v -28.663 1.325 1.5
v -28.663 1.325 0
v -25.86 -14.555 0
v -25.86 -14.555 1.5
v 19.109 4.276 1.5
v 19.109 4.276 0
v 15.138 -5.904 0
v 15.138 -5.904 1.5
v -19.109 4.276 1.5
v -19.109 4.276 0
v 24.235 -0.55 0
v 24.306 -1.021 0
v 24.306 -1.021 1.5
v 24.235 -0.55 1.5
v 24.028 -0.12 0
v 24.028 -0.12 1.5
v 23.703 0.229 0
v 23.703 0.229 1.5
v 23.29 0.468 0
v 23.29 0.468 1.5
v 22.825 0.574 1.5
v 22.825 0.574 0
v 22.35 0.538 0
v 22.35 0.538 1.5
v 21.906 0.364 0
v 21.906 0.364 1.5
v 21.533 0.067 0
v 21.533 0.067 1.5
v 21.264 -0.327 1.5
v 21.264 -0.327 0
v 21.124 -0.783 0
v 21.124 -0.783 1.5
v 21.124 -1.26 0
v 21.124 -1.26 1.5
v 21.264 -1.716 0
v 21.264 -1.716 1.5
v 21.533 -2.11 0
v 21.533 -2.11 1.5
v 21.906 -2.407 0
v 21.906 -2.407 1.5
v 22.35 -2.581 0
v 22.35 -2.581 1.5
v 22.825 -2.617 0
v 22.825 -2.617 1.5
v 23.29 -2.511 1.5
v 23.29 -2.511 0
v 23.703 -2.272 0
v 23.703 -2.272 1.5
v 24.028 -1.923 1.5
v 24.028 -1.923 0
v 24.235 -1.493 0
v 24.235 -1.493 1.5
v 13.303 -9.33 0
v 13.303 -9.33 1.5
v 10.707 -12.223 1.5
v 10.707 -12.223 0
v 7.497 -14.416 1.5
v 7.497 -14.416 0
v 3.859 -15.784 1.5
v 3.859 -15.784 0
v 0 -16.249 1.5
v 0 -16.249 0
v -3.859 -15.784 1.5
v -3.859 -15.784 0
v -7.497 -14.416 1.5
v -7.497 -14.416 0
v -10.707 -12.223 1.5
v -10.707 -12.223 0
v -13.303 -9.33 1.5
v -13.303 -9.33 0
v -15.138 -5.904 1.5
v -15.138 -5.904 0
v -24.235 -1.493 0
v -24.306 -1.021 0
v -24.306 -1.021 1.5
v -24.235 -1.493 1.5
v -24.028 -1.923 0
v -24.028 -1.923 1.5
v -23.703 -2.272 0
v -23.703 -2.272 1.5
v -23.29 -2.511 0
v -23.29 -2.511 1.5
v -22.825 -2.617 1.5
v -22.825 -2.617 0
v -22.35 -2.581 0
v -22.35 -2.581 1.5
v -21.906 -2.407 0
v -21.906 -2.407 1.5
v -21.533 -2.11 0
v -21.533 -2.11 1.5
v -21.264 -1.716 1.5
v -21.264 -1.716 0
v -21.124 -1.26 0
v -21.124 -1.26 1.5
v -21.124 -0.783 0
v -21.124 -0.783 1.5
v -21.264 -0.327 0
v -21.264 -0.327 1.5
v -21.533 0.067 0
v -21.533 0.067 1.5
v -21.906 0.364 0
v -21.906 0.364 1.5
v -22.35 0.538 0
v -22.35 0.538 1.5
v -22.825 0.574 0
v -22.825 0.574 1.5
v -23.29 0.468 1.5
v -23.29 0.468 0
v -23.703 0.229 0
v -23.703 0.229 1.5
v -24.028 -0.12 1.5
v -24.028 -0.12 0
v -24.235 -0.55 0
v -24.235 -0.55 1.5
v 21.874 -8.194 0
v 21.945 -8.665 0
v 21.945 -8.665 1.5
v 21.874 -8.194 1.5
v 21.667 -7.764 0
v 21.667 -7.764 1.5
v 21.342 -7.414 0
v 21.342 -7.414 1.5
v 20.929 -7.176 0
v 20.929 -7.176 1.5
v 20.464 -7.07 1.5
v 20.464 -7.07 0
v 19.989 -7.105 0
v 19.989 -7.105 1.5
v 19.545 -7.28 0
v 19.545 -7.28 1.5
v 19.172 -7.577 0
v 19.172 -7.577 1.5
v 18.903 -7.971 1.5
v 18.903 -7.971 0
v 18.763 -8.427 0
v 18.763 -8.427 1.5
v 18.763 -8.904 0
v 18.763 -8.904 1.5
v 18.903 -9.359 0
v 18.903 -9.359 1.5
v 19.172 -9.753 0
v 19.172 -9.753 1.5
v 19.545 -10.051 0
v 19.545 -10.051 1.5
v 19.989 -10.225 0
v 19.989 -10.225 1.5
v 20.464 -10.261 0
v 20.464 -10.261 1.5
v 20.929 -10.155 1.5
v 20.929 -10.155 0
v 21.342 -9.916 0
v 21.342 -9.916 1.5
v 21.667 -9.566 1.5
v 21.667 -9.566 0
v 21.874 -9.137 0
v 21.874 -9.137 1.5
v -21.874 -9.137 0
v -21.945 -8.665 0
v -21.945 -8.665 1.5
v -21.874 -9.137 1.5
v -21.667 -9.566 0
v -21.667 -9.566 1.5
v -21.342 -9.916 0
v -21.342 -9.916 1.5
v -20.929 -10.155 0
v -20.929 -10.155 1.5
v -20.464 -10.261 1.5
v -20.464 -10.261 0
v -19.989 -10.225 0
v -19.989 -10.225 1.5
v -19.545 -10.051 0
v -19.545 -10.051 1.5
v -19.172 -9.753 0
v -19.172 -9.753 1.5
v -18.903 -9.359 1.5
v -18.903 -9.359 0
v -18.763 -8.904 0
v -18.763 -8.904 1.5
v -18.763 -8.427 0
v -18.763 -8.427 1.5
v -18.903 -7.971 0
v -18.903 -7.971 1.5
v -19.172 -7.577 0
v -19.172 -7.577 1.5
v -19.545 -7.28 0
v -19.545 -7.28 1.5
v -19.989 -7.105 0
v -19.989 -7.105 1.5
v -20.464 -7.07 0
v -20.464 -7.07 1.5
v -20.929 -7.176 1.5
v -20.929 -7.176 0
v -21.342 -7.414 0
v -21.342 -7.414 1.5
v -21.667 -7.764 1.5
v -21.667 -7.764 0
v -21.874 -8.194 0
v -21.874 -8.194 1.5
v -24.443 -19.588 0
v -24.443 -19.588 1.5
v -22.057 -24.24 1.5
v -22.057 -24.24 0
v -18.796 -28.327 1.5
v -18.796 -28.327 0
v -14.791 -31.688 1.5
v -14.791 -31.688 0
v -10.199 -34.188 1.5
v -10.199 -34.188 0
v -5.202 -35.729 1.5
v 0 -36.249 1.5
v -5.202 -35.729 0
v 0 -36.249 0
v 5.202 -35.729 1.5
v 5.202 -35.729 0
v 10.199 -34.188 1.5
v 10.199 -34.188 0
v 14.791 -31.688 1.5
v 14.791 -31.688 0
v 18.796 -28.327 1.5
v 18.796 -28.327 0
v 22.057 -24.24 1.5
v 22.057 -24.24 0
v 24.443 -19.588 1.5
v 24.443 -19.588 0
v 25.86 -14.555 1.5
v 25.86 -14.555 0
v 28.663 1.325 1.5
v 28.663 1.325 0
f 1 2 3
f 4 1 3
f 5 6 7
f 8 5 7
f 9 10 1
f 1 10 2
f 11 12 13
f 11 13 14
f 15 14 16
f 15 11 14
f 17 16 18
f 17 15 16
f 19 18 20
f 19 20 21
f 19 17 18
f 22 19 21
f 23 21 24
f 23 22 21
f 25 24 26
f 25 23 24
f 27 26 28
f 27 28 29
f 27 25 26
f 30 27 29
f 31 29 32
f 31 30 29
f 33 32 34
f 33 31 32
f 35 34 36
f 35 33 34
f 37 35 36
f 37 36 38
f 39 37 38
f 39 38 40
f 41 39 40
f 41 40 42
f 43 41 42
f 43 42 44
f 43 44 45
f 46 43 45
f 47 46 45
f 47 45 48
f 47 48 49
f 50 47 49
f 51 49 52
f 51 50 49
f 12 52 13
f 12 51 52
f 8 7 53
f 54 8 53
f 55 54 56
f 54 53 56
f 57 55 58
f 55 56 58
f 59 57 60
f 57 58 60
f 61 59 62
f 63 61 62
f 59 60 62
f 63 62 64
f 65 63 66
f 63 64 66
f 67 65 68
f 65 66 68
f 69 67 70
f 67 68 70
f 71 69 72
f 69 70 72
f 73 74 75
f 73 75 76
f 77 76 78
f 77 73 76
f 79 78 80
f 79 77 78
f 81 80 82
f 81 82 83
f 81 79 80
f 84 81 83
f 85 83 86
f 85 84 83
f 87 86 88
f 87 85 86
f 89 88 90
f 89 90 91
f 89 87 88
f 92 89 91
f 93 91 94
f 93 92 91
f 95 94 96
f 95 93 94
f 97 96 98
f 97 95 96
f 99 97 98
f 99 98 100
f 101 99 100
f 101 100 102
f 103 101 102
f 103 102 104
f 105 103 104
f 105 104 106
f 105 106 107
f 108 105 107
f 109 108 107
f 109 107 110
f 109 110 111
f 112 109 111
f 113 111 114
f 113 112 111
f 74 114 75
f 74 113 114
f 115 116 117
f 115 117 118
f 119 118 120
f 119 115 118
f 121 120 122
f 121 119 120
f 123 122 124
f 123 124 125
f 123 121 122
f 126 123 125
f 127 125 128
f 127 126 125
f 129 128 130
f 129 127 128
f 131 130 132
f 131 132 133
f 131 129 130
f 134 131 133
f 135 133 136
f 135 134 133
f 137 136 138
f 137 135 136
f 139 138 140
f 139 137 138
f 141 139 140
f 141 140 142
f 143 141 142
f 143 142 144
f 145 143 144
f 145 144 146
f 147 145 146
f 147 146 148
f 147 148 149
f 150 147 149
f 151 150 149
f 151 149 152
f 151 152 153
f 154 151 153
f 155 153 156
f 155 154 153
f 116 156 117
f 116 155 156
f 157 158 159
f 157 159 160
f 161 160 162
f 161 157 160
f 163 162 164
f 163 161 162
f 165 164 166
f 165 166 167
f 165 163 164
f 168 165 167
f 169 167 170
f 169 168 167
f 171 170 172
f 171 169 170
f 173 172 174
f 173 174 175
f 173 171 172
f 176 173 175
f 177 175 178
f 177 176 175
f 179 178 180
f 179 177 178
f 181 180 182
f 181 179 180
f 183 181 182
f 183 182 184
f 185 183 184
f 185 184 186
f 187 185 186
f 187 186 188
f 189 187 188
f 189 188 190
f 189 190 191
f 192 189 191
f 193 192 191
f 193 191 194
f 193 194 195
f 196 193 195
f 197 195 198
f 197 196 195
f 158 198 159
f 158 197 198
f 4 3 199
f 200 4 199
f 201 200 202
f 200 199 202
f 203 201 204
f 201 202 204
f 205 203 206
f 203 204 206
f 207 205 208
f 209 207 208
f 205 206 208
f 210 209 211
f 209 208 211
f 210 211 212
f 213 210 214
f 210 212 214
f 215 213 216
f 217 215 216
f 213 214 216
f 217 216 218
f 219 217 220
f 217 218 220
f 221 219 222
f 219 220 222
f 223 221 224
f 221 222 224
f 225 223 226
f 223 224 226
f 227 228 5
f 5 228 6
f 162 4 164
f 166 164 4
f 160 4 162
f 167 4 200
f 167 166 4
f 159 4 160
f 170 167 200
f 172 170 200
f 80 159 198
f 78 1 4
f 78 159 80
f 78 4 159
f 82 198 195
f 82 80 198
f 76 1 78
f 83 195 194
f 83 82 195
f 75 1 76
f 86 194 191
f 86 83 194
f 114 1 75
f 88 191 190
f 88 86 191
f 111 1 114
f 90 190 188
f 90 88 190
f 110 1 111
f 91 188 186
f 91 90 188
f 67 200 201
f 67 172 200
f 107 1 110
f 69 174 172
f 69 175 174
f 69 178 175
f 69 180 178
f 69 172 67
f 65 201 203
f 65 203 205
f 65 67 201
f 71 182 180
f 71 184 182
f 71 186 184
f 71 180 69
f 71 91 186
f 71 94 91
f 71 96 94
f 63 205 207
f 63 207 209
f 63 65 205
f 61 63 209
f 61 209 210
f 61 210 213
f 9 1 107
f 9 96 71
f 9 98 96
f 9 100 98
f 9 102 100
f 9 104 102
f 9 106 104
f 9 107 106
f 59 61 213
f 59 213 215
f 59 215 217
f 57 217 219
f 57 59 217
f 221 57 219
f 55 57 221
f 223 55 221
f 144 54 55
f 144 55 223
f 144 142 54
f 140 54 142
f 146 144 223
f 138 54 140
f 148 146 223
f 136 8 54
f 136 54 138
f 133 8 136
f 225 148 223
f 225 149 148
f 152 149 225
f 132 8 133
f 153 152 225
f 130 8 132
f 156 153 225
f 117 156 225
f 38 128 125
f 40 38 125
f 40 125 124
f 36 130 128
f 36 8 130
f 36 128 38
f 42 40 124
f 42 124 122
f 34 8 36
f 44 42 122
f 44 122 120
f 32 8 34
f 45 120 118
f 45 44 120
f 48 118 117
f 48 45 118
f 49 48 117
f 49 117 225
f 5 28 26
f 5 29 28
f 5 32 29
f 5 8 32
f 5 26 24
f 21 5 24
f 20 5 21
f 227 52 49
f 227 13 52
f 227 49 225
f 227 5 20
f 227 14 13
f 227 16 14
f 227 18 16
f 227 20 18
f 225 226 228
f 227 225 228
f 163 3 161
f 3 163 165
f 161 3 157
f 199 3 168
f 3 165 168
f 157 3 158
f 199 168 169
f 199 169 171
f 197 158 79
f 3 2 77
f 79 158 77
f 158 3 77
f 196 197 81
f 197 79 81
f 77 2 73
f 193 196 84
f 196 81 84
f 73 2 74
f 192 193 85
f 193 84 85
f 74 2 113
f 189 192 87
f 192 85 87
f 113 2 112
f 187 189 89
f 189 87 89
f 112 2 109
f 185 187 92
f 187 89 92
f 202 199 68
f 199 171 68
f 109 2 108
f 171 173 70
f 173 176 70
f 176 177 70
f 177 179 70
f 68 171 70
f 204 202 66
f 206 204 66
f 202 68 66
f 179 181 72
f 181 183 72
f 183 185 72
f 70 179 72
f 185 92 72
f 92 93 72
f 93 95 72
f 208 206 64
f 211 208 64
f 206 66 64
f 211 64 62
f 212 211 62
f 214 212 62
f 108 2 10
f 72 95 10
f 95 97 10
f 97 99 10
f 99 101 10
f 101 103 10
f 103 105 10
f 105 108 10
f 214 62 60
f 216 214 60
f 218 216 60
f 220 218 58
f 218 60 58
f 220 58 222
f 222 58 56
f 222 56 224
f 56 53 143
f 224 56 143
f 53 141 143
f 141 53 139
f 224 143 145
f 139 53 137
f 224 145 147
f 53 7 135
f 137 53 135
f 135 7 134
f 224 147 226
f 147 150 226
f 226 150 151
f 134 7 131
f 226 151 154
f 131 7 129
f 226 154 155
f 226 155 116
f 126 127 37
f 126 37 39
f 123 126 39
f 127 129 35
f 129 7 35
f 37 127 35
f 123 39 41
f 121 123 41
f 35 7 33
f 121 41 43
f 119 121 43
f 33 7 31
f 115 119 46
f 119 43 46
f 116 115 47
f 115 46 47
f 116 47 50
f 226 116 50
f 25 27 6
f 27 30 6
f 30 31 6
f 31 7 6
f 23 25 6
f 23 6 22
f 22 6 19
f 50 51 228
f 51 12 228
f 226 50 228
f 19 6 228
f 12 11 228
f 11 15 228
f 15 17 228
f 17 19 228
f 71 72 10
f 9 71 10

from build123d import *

# Parameters (mm, degrees)
SKETCH1_R           = 1.6
BOSS_EXTRUDE1_DEPTH = 1.5


with BuildPart() as part:
    # Sketch1 → Boss-Extrude1 (new body)
    with BuildSketch(Plane.XY):
        with BuildLine():
            Line((25.85974293, -14.554976912), (28.663386119, 1.32487132))
            Line((28.663386119, 1.32487132), (19.108746057, 4.275947949))
            Line((19.108746057, 4.275947949), (15.138453004, -5.904104582))
            ThreePointArc((15.138453004, -5.904104582), (0, -16.249037211), (-15.138453004, -5.904104582))
            Line((-15.138453004, -5.904104582), (-19.108746057, 4.275947949))
            Line((-19.108746057, 4.275947949), (-28.663386119, 1.32487132))
            Line((-28.663386119, 1.32487132), (-25.85974293, -14.554976912))
            ThreePointArc((-25.85974293, -14.554976912), (0, -36.249037211), (25.85974293, -14.554976912))
        make_face()
        with Locations(Location((-20.344774133, -8.665158441, 0), (0, 0, 180))):
            Circle(SKETCH1_R, mode=Mode.SUBTRACT)
        with Locations(Location((-22.705635436, -1.021446391, 0), (0, 0, 180))):
            Circle(SKETCH1_R, mode=Mode.SUBTRACT)
        with Locations((22.705635436, -1.021446391)):
            Circle(SKETCH1_R, mode=Mode.SUBTRACT)
        with Locations((20.344774133, -8.665158441)):
            Circle(SKETCH1_R, mode=Mode.SUBTRACT)
    extrude(amount=BOSS_EXTRUDE1_DEPTH)


solid = part.part
